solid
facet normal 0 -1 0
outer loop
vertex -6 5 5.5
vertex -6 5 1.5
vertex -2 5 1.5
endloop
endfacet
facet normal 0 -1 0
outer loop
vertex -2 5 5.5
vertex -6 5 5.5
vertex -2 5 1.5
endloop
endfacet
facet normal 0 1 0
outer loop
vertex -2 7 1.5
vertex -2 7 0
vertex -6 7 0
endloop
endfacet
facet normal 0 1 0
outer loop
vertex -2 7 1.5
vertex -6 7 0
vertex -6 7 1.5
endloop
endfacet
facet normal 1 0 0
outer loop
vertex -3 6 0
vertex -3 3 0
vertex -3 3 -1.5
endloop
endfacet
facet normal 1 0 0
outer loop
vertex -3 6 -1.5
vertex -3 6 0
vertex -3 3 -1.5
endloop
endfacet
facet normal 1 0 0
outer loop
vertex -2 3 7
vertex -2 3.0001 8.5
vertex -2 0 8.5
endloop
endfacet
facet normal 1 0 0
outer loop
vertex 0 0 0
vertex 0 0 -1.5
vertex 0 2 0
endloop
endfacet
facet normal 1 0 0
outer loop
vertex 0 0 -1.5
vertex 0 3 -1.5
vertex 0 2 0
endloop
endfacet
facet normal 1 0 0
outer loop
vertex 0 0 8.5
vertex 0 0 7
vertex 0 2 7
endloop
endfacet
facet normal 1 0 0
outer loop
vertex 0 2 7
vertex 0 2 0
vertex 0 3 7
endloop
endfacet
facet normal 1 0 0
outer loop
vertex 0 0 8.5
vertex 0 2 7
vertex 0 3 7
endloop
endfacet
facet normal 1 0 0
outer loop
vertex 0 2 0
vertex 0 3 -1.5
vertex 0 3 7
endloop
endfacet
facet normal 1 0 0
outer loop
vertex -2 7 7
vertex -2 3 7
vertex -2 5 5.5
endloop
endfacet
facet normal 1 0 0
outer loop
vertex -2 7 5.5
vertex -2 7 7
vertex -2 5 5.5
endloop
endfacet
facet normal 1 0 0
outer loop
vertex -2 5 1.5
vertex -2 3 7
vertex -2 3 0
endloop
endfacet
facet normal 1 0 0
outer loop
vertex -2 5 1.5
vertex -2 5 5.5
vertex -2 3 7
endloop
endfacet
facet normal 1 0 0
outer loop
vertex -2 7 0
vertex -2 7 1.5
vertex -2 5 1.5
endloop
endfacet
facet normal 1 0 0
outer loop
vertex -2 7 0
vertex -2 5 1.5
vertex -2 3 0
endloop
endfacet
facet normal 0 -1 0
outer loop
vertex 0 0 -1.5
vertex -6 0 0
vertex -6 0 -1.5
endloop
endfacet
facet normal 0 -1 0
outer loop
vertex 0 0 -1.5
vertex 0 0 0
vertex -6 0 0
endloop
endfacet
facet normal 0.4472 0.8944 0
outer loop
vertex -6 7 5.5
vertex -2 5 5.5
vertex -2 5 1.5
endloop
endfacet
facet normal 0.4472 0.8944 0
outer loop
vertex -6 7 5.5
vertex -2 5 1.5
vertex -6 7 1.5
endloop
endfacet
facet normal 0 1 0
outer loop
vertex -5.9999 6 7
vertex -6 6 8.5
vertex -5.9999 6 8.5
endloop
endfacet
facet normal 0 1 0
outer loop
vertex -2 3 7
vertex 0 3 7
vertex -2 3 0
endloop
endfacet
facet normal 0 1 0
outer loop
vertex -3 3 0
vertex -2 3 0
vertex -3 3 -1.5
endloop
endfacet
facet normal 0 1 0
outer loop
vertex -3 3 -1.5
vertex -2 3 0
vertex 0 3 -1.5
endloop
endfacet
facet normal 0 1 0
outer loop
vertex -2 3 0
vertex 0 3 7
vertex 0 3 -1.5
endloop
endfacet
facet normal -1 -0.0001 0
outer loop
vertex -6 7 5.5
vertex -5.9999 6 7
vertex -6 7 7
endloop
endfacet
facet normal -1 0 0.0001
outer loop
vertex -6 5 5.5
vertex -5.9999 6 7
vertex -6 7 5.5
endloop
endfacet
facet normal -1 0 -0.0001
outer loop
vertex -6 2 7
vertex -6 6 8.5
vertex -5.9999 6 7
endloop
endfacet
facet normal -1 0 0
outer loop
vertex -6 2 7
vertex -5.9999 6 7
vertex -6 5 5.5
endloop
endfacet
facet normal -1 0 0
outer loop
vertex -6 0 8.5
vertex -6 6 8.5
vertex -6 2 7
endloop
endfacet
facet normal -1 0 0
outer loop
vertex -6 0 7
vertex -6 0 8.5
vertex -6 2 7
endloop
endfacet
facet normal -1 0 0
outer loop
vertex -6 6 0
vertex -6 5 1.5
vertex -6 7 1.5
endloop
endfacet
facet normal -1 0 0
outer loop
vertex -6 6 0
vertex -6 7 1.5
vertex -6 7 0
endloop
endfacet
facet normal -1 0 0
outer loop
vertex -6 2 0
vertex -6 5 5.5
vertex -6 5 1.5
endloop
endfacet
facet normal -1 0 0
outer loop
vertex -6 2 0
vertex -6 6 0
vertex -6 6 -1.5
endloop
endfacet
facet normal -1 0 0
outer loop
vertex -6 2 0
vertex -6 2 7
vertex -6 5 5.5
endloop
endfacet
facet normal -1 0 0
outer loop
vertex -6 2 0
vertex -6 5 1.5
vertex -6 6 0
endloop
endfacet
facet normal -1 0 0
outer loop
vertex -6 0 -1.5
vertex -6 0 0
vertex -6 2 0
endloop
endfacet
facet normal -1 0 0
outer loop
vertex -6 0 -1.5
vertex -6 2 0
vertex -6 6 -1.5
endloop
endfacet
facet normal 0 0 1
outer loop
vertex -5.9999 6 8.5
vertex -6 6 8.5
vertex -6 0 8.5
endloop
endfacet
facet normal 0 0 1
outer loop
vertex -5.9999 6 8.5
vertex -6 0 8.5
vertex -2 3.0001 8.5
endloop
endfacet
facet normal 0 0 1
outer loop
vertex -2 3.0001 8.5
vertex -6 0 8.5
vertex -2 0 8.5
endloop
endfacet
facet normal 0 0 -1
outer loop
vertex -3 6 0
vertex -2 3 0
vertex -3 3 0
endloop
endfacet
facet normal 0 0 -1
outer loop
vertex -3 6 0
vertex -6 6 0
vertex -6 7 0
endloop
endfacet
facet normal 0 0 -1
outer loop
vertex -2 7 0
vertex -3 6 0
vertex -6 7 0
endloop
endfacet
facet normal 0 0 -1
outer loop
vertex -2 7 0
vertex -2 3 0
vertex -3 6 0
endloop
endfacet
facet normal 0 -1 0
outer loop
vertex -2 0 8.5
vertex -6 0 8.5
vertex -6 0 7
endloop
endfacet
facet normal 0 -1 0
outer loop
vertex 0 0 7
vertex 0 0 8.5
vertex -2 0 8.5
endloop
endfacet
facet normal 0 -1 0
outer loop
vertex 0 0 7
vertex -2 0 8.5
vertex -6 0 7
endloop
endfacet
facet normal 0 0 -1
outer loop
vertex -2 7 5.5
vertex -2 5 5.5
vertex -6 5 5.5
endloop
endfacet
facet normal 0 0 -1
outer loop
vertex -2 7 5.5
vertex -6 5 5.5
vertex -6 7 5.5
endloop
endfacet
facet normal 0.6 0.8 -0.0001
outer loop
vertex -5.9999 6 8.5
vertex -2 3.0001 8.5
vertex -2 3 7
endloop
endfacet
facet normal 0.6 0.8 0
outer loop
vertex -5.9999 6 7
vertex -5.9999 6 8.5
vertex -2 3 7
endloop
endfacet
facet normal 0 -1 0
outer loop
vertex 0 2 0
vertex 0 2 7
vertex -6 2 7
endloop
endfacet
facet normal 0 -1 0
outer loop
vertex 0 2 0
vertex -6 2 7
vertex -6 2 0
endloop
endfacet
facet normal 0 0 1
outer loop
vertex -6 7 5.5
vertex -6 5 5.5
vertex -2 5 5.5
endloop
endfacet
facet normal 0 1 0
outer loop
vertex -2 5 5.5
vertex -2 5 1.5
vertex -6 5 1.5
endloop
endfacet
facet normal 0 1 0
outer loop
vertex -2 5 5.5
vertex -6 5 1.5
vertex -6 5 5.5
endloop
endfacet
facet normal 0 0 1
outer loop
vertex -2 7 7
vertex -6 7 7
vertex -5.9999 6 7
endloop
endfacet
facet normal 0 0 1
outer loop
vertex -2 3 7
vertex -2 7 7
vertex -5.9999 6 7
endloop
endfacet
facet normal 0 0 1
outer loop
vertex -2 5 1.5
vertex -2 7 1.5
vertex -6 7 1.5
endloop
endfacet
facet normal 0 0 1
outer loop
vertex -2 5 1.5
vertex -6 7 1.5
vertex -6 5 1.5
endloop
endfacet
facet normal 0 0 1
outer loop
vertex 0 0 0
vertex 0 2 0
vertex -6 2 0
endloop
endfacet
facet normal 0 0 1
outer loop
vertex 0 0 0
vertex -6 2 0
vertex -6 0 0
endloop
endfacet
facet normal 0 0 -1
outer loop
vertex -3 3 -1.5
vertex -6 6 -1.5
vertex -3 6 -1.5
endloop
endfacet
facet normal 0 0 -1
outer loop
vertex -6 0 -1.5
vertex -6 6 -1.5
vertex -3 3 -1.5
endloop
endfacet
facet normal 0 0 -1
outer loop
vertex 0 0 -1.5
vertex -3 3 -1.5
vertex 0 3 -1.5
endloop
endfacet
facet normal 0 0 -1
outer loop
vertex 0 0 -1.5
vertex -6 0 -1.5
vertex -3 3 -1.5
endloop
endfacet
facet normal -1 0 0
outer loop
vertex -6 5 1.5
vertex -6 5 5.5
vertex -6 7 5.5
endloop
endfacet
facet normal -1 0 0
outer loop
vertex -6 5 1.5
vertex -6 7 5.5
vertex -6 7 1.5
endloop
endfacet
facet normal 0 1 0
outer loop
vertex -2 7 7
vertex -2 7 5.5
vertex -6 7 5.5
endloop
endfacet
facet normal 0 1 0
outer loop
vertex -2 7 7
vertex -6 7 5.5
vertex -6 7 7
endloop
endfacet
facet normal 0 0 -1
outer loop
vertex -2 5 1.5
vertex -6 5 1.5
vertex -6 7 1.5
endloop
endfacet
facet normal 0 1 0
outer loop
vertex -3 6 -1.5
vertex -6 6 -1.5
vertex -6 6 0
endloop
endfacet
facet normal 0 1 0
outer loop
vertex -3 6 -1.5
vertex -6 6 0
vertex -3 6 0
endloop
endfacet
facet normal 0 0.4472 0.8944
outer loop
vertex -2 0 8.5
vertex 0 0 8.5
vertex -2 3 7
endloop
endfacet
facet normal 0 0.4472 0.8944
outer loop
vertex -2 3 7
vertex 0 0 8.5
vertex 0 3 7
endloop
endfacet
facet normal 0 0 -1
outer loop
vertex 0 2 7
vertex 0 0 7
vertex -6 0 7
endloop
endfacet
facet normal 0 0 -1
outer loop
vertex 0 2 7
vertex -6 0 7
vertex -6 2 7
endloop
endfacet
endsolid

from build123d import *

# Parameters (mm, degrees)
SALIENTE_EXTRUIR1_DEPTH = 2
CHAFL_N2_SIZE           = 3
CHAFL_N2_SIZE_2         = 1.5
SALIENTE_EXTRUIR2_DEPTH = 4
CROQUIS3_W              = 4
CROQUIS3_H              = 1.5
SALIENTE_EXTRUIR3_DEPTH = 3
CHAFL_N3_SIZE2          = 3
CHAFL_N3_SIZE           = 4
SALIENTE_EXTRUIR4_DEPTH = 4
CROQUIS5_W              = 4
CROQUIS5_H              = 4
SALIENTE_EXTRUIR5_DEPTH = 2
CHAFL_N4_SIZE           = 2
CHAFL_N4_SIZE_2         = 4
CROQUIS6_W              = 3
CROQUIS6_H              = 1.5
SALIENTE_EXTRUIR6_DEPTH = 3


# Some blends are built 0.0001 mm under size
with BuildPart() as part:
    # Croquis1 → Saliente-Extruir1 (new body)
    with BuildSketch(Plane(origin=(0, 0, 0), x_dir=(0, 0, -1), z_dir=(1, 0, 0))):
        Polygon((0, 0), (0, 2), (-7, 2), (-7, 0), (-8.5, 0), (-8.5, 3), (1.5, 3), (1.5, 0), align=None)
    extrude(amount=-SALIENTE_EXTRUIR1_DEPTH)

    # Chaflán2
    # the kernel refuses this chamfer: 3, 1.5 mm, written as the material it takes off along each edge
    with BuildSketch(Plane(origin=(7.769486621, 3, 8.5), x_dir=(0, -0.9998508956747117, 0.017268075123667865), z_dir=(-1, 0, 0))) as chafl_n2_piece_1:
        Polygon((CHAFL_N2_SIZE * 0.999850895675, -CHAFL_N2_SIZE * 0.0172680751237), (-CHAFL_N2_SIZE_2 * 0.0172680751237, -CHAFL_N2_SIZE_2 * 0.999850895675), (0, 0), align=None)
    extrude(amount=17.538973243, mode=Mode.SUBTRACT)

    # Croquis2 → Saliente-Extruir2 (add)
    with BuildSketch(Plane.ZY.offset(2)):
        Polygon((7, 3), (8.5, 3), (8.5, 0), (7, 0), (7, 2), (0, 2), (0, 0), (-1.5, 0), (-1.5, 3), align=None)
    extrude(amount=SALIENTE_EXTRUIR2_DEPTH)

    # Croquis3 → Saliente-Extruir3 (add)
    with BuildSketch(Plane(origin=(0, 3, 0), x_dir=(1, 0, 0), z_dir=(0, 1, 0))):
        with Locations((-4, -7.75)):
            Rectangle(CROQUIS3_W, CROQUIS3_H)
    extrude(amount=SALIENTE_EXTRUIR3_DEPTH)

    # Chaflán3
    chafl_n3_edges = [part.edges().sort_by_distance(p)[0] for p in [
        (-2, 6, 7.75),
    ]]
    chafl_n3_side = [part.faces().sort_by_distance(p)[0] for p in [
        (-2.06, 6, 7.75),
    ]]
    chamfer(chafl_n3_edges, length=CHAFL_N3_SIZE - 0.0001, length2=CHAFL_N3_SIZE2 - 0.0001, reference=chafl_n3_side[0])  # a hair under: the kernel refuses the full size

    # Croquis4 → Saliente-Extruir4 (add)
    with BuildSketch(Plane(origin=(-2, 0, 0), x_dir=(0, 0, -1), z_dir=(1, 0, 0))):
        Polygon((-7, 3), (0, 3), (0, 7), (-1.5, 7), (-1.5, 5), (-5.5, 5), (-5.5, 7), (-7, 7), align=None)
    extrude(amount=-SALIENTE_EXTRUIR4_DEPTH)

    # Croquis6 → Saliente-Extruir6 (add)
    with BuildSketch(Plane(origin=(0, 3, 0), x_dir=(1, 0, 0), z_dir=(0, 1, 0))):
        with Locations((-4.5, 0.75)):
            Rectangle(CROQUIS6_W, CROQUIS6_H)
    extrude(amount=SALIENTE_EXTRUIR6_DEPTH)


with BuildPart() as body_2:
    # Croquis5 → Saliente-Extruir5 (new body)
    with BuildSketch(Plane(origin=(0, 5, 0), x_dir=(1, 0, 0), z_dir=(0, 1, 0))):
        with Locations((-4, -3.5)):
            Rectangle(CROQUIS5_W, CROQUIS5_H)
    extrude(amount=SALIENTE_EXTRUIR5_DEPTH)

    # Chaflán4
    # the kernel refuses this chamfer: 4, 2 mm, written as the material it takes off along each edge
    with BuildSketch(Plane(origin=(-2, 7, 15.859315495), x_dir=(0.06891834360170881, -0.9976223042390326, 0), z_dir=(0, 0, -1))) as chafl_n4_piece_1:
        Polygon((CHAFL_N4_SIZE * 0.997622304239, CHAFL_N4_SIZE * 0.0689183436017), (-CHAFL_N4_SIZE_2 * 0.0689183436017, CHAFL_N4_SIZE_2 * 0.997622304239), (0, 0), align=None)
    extrude(amount=24.71863099, mode=Mode.SUBTRACT)


solid = Compound([part.part, body_2.part])
